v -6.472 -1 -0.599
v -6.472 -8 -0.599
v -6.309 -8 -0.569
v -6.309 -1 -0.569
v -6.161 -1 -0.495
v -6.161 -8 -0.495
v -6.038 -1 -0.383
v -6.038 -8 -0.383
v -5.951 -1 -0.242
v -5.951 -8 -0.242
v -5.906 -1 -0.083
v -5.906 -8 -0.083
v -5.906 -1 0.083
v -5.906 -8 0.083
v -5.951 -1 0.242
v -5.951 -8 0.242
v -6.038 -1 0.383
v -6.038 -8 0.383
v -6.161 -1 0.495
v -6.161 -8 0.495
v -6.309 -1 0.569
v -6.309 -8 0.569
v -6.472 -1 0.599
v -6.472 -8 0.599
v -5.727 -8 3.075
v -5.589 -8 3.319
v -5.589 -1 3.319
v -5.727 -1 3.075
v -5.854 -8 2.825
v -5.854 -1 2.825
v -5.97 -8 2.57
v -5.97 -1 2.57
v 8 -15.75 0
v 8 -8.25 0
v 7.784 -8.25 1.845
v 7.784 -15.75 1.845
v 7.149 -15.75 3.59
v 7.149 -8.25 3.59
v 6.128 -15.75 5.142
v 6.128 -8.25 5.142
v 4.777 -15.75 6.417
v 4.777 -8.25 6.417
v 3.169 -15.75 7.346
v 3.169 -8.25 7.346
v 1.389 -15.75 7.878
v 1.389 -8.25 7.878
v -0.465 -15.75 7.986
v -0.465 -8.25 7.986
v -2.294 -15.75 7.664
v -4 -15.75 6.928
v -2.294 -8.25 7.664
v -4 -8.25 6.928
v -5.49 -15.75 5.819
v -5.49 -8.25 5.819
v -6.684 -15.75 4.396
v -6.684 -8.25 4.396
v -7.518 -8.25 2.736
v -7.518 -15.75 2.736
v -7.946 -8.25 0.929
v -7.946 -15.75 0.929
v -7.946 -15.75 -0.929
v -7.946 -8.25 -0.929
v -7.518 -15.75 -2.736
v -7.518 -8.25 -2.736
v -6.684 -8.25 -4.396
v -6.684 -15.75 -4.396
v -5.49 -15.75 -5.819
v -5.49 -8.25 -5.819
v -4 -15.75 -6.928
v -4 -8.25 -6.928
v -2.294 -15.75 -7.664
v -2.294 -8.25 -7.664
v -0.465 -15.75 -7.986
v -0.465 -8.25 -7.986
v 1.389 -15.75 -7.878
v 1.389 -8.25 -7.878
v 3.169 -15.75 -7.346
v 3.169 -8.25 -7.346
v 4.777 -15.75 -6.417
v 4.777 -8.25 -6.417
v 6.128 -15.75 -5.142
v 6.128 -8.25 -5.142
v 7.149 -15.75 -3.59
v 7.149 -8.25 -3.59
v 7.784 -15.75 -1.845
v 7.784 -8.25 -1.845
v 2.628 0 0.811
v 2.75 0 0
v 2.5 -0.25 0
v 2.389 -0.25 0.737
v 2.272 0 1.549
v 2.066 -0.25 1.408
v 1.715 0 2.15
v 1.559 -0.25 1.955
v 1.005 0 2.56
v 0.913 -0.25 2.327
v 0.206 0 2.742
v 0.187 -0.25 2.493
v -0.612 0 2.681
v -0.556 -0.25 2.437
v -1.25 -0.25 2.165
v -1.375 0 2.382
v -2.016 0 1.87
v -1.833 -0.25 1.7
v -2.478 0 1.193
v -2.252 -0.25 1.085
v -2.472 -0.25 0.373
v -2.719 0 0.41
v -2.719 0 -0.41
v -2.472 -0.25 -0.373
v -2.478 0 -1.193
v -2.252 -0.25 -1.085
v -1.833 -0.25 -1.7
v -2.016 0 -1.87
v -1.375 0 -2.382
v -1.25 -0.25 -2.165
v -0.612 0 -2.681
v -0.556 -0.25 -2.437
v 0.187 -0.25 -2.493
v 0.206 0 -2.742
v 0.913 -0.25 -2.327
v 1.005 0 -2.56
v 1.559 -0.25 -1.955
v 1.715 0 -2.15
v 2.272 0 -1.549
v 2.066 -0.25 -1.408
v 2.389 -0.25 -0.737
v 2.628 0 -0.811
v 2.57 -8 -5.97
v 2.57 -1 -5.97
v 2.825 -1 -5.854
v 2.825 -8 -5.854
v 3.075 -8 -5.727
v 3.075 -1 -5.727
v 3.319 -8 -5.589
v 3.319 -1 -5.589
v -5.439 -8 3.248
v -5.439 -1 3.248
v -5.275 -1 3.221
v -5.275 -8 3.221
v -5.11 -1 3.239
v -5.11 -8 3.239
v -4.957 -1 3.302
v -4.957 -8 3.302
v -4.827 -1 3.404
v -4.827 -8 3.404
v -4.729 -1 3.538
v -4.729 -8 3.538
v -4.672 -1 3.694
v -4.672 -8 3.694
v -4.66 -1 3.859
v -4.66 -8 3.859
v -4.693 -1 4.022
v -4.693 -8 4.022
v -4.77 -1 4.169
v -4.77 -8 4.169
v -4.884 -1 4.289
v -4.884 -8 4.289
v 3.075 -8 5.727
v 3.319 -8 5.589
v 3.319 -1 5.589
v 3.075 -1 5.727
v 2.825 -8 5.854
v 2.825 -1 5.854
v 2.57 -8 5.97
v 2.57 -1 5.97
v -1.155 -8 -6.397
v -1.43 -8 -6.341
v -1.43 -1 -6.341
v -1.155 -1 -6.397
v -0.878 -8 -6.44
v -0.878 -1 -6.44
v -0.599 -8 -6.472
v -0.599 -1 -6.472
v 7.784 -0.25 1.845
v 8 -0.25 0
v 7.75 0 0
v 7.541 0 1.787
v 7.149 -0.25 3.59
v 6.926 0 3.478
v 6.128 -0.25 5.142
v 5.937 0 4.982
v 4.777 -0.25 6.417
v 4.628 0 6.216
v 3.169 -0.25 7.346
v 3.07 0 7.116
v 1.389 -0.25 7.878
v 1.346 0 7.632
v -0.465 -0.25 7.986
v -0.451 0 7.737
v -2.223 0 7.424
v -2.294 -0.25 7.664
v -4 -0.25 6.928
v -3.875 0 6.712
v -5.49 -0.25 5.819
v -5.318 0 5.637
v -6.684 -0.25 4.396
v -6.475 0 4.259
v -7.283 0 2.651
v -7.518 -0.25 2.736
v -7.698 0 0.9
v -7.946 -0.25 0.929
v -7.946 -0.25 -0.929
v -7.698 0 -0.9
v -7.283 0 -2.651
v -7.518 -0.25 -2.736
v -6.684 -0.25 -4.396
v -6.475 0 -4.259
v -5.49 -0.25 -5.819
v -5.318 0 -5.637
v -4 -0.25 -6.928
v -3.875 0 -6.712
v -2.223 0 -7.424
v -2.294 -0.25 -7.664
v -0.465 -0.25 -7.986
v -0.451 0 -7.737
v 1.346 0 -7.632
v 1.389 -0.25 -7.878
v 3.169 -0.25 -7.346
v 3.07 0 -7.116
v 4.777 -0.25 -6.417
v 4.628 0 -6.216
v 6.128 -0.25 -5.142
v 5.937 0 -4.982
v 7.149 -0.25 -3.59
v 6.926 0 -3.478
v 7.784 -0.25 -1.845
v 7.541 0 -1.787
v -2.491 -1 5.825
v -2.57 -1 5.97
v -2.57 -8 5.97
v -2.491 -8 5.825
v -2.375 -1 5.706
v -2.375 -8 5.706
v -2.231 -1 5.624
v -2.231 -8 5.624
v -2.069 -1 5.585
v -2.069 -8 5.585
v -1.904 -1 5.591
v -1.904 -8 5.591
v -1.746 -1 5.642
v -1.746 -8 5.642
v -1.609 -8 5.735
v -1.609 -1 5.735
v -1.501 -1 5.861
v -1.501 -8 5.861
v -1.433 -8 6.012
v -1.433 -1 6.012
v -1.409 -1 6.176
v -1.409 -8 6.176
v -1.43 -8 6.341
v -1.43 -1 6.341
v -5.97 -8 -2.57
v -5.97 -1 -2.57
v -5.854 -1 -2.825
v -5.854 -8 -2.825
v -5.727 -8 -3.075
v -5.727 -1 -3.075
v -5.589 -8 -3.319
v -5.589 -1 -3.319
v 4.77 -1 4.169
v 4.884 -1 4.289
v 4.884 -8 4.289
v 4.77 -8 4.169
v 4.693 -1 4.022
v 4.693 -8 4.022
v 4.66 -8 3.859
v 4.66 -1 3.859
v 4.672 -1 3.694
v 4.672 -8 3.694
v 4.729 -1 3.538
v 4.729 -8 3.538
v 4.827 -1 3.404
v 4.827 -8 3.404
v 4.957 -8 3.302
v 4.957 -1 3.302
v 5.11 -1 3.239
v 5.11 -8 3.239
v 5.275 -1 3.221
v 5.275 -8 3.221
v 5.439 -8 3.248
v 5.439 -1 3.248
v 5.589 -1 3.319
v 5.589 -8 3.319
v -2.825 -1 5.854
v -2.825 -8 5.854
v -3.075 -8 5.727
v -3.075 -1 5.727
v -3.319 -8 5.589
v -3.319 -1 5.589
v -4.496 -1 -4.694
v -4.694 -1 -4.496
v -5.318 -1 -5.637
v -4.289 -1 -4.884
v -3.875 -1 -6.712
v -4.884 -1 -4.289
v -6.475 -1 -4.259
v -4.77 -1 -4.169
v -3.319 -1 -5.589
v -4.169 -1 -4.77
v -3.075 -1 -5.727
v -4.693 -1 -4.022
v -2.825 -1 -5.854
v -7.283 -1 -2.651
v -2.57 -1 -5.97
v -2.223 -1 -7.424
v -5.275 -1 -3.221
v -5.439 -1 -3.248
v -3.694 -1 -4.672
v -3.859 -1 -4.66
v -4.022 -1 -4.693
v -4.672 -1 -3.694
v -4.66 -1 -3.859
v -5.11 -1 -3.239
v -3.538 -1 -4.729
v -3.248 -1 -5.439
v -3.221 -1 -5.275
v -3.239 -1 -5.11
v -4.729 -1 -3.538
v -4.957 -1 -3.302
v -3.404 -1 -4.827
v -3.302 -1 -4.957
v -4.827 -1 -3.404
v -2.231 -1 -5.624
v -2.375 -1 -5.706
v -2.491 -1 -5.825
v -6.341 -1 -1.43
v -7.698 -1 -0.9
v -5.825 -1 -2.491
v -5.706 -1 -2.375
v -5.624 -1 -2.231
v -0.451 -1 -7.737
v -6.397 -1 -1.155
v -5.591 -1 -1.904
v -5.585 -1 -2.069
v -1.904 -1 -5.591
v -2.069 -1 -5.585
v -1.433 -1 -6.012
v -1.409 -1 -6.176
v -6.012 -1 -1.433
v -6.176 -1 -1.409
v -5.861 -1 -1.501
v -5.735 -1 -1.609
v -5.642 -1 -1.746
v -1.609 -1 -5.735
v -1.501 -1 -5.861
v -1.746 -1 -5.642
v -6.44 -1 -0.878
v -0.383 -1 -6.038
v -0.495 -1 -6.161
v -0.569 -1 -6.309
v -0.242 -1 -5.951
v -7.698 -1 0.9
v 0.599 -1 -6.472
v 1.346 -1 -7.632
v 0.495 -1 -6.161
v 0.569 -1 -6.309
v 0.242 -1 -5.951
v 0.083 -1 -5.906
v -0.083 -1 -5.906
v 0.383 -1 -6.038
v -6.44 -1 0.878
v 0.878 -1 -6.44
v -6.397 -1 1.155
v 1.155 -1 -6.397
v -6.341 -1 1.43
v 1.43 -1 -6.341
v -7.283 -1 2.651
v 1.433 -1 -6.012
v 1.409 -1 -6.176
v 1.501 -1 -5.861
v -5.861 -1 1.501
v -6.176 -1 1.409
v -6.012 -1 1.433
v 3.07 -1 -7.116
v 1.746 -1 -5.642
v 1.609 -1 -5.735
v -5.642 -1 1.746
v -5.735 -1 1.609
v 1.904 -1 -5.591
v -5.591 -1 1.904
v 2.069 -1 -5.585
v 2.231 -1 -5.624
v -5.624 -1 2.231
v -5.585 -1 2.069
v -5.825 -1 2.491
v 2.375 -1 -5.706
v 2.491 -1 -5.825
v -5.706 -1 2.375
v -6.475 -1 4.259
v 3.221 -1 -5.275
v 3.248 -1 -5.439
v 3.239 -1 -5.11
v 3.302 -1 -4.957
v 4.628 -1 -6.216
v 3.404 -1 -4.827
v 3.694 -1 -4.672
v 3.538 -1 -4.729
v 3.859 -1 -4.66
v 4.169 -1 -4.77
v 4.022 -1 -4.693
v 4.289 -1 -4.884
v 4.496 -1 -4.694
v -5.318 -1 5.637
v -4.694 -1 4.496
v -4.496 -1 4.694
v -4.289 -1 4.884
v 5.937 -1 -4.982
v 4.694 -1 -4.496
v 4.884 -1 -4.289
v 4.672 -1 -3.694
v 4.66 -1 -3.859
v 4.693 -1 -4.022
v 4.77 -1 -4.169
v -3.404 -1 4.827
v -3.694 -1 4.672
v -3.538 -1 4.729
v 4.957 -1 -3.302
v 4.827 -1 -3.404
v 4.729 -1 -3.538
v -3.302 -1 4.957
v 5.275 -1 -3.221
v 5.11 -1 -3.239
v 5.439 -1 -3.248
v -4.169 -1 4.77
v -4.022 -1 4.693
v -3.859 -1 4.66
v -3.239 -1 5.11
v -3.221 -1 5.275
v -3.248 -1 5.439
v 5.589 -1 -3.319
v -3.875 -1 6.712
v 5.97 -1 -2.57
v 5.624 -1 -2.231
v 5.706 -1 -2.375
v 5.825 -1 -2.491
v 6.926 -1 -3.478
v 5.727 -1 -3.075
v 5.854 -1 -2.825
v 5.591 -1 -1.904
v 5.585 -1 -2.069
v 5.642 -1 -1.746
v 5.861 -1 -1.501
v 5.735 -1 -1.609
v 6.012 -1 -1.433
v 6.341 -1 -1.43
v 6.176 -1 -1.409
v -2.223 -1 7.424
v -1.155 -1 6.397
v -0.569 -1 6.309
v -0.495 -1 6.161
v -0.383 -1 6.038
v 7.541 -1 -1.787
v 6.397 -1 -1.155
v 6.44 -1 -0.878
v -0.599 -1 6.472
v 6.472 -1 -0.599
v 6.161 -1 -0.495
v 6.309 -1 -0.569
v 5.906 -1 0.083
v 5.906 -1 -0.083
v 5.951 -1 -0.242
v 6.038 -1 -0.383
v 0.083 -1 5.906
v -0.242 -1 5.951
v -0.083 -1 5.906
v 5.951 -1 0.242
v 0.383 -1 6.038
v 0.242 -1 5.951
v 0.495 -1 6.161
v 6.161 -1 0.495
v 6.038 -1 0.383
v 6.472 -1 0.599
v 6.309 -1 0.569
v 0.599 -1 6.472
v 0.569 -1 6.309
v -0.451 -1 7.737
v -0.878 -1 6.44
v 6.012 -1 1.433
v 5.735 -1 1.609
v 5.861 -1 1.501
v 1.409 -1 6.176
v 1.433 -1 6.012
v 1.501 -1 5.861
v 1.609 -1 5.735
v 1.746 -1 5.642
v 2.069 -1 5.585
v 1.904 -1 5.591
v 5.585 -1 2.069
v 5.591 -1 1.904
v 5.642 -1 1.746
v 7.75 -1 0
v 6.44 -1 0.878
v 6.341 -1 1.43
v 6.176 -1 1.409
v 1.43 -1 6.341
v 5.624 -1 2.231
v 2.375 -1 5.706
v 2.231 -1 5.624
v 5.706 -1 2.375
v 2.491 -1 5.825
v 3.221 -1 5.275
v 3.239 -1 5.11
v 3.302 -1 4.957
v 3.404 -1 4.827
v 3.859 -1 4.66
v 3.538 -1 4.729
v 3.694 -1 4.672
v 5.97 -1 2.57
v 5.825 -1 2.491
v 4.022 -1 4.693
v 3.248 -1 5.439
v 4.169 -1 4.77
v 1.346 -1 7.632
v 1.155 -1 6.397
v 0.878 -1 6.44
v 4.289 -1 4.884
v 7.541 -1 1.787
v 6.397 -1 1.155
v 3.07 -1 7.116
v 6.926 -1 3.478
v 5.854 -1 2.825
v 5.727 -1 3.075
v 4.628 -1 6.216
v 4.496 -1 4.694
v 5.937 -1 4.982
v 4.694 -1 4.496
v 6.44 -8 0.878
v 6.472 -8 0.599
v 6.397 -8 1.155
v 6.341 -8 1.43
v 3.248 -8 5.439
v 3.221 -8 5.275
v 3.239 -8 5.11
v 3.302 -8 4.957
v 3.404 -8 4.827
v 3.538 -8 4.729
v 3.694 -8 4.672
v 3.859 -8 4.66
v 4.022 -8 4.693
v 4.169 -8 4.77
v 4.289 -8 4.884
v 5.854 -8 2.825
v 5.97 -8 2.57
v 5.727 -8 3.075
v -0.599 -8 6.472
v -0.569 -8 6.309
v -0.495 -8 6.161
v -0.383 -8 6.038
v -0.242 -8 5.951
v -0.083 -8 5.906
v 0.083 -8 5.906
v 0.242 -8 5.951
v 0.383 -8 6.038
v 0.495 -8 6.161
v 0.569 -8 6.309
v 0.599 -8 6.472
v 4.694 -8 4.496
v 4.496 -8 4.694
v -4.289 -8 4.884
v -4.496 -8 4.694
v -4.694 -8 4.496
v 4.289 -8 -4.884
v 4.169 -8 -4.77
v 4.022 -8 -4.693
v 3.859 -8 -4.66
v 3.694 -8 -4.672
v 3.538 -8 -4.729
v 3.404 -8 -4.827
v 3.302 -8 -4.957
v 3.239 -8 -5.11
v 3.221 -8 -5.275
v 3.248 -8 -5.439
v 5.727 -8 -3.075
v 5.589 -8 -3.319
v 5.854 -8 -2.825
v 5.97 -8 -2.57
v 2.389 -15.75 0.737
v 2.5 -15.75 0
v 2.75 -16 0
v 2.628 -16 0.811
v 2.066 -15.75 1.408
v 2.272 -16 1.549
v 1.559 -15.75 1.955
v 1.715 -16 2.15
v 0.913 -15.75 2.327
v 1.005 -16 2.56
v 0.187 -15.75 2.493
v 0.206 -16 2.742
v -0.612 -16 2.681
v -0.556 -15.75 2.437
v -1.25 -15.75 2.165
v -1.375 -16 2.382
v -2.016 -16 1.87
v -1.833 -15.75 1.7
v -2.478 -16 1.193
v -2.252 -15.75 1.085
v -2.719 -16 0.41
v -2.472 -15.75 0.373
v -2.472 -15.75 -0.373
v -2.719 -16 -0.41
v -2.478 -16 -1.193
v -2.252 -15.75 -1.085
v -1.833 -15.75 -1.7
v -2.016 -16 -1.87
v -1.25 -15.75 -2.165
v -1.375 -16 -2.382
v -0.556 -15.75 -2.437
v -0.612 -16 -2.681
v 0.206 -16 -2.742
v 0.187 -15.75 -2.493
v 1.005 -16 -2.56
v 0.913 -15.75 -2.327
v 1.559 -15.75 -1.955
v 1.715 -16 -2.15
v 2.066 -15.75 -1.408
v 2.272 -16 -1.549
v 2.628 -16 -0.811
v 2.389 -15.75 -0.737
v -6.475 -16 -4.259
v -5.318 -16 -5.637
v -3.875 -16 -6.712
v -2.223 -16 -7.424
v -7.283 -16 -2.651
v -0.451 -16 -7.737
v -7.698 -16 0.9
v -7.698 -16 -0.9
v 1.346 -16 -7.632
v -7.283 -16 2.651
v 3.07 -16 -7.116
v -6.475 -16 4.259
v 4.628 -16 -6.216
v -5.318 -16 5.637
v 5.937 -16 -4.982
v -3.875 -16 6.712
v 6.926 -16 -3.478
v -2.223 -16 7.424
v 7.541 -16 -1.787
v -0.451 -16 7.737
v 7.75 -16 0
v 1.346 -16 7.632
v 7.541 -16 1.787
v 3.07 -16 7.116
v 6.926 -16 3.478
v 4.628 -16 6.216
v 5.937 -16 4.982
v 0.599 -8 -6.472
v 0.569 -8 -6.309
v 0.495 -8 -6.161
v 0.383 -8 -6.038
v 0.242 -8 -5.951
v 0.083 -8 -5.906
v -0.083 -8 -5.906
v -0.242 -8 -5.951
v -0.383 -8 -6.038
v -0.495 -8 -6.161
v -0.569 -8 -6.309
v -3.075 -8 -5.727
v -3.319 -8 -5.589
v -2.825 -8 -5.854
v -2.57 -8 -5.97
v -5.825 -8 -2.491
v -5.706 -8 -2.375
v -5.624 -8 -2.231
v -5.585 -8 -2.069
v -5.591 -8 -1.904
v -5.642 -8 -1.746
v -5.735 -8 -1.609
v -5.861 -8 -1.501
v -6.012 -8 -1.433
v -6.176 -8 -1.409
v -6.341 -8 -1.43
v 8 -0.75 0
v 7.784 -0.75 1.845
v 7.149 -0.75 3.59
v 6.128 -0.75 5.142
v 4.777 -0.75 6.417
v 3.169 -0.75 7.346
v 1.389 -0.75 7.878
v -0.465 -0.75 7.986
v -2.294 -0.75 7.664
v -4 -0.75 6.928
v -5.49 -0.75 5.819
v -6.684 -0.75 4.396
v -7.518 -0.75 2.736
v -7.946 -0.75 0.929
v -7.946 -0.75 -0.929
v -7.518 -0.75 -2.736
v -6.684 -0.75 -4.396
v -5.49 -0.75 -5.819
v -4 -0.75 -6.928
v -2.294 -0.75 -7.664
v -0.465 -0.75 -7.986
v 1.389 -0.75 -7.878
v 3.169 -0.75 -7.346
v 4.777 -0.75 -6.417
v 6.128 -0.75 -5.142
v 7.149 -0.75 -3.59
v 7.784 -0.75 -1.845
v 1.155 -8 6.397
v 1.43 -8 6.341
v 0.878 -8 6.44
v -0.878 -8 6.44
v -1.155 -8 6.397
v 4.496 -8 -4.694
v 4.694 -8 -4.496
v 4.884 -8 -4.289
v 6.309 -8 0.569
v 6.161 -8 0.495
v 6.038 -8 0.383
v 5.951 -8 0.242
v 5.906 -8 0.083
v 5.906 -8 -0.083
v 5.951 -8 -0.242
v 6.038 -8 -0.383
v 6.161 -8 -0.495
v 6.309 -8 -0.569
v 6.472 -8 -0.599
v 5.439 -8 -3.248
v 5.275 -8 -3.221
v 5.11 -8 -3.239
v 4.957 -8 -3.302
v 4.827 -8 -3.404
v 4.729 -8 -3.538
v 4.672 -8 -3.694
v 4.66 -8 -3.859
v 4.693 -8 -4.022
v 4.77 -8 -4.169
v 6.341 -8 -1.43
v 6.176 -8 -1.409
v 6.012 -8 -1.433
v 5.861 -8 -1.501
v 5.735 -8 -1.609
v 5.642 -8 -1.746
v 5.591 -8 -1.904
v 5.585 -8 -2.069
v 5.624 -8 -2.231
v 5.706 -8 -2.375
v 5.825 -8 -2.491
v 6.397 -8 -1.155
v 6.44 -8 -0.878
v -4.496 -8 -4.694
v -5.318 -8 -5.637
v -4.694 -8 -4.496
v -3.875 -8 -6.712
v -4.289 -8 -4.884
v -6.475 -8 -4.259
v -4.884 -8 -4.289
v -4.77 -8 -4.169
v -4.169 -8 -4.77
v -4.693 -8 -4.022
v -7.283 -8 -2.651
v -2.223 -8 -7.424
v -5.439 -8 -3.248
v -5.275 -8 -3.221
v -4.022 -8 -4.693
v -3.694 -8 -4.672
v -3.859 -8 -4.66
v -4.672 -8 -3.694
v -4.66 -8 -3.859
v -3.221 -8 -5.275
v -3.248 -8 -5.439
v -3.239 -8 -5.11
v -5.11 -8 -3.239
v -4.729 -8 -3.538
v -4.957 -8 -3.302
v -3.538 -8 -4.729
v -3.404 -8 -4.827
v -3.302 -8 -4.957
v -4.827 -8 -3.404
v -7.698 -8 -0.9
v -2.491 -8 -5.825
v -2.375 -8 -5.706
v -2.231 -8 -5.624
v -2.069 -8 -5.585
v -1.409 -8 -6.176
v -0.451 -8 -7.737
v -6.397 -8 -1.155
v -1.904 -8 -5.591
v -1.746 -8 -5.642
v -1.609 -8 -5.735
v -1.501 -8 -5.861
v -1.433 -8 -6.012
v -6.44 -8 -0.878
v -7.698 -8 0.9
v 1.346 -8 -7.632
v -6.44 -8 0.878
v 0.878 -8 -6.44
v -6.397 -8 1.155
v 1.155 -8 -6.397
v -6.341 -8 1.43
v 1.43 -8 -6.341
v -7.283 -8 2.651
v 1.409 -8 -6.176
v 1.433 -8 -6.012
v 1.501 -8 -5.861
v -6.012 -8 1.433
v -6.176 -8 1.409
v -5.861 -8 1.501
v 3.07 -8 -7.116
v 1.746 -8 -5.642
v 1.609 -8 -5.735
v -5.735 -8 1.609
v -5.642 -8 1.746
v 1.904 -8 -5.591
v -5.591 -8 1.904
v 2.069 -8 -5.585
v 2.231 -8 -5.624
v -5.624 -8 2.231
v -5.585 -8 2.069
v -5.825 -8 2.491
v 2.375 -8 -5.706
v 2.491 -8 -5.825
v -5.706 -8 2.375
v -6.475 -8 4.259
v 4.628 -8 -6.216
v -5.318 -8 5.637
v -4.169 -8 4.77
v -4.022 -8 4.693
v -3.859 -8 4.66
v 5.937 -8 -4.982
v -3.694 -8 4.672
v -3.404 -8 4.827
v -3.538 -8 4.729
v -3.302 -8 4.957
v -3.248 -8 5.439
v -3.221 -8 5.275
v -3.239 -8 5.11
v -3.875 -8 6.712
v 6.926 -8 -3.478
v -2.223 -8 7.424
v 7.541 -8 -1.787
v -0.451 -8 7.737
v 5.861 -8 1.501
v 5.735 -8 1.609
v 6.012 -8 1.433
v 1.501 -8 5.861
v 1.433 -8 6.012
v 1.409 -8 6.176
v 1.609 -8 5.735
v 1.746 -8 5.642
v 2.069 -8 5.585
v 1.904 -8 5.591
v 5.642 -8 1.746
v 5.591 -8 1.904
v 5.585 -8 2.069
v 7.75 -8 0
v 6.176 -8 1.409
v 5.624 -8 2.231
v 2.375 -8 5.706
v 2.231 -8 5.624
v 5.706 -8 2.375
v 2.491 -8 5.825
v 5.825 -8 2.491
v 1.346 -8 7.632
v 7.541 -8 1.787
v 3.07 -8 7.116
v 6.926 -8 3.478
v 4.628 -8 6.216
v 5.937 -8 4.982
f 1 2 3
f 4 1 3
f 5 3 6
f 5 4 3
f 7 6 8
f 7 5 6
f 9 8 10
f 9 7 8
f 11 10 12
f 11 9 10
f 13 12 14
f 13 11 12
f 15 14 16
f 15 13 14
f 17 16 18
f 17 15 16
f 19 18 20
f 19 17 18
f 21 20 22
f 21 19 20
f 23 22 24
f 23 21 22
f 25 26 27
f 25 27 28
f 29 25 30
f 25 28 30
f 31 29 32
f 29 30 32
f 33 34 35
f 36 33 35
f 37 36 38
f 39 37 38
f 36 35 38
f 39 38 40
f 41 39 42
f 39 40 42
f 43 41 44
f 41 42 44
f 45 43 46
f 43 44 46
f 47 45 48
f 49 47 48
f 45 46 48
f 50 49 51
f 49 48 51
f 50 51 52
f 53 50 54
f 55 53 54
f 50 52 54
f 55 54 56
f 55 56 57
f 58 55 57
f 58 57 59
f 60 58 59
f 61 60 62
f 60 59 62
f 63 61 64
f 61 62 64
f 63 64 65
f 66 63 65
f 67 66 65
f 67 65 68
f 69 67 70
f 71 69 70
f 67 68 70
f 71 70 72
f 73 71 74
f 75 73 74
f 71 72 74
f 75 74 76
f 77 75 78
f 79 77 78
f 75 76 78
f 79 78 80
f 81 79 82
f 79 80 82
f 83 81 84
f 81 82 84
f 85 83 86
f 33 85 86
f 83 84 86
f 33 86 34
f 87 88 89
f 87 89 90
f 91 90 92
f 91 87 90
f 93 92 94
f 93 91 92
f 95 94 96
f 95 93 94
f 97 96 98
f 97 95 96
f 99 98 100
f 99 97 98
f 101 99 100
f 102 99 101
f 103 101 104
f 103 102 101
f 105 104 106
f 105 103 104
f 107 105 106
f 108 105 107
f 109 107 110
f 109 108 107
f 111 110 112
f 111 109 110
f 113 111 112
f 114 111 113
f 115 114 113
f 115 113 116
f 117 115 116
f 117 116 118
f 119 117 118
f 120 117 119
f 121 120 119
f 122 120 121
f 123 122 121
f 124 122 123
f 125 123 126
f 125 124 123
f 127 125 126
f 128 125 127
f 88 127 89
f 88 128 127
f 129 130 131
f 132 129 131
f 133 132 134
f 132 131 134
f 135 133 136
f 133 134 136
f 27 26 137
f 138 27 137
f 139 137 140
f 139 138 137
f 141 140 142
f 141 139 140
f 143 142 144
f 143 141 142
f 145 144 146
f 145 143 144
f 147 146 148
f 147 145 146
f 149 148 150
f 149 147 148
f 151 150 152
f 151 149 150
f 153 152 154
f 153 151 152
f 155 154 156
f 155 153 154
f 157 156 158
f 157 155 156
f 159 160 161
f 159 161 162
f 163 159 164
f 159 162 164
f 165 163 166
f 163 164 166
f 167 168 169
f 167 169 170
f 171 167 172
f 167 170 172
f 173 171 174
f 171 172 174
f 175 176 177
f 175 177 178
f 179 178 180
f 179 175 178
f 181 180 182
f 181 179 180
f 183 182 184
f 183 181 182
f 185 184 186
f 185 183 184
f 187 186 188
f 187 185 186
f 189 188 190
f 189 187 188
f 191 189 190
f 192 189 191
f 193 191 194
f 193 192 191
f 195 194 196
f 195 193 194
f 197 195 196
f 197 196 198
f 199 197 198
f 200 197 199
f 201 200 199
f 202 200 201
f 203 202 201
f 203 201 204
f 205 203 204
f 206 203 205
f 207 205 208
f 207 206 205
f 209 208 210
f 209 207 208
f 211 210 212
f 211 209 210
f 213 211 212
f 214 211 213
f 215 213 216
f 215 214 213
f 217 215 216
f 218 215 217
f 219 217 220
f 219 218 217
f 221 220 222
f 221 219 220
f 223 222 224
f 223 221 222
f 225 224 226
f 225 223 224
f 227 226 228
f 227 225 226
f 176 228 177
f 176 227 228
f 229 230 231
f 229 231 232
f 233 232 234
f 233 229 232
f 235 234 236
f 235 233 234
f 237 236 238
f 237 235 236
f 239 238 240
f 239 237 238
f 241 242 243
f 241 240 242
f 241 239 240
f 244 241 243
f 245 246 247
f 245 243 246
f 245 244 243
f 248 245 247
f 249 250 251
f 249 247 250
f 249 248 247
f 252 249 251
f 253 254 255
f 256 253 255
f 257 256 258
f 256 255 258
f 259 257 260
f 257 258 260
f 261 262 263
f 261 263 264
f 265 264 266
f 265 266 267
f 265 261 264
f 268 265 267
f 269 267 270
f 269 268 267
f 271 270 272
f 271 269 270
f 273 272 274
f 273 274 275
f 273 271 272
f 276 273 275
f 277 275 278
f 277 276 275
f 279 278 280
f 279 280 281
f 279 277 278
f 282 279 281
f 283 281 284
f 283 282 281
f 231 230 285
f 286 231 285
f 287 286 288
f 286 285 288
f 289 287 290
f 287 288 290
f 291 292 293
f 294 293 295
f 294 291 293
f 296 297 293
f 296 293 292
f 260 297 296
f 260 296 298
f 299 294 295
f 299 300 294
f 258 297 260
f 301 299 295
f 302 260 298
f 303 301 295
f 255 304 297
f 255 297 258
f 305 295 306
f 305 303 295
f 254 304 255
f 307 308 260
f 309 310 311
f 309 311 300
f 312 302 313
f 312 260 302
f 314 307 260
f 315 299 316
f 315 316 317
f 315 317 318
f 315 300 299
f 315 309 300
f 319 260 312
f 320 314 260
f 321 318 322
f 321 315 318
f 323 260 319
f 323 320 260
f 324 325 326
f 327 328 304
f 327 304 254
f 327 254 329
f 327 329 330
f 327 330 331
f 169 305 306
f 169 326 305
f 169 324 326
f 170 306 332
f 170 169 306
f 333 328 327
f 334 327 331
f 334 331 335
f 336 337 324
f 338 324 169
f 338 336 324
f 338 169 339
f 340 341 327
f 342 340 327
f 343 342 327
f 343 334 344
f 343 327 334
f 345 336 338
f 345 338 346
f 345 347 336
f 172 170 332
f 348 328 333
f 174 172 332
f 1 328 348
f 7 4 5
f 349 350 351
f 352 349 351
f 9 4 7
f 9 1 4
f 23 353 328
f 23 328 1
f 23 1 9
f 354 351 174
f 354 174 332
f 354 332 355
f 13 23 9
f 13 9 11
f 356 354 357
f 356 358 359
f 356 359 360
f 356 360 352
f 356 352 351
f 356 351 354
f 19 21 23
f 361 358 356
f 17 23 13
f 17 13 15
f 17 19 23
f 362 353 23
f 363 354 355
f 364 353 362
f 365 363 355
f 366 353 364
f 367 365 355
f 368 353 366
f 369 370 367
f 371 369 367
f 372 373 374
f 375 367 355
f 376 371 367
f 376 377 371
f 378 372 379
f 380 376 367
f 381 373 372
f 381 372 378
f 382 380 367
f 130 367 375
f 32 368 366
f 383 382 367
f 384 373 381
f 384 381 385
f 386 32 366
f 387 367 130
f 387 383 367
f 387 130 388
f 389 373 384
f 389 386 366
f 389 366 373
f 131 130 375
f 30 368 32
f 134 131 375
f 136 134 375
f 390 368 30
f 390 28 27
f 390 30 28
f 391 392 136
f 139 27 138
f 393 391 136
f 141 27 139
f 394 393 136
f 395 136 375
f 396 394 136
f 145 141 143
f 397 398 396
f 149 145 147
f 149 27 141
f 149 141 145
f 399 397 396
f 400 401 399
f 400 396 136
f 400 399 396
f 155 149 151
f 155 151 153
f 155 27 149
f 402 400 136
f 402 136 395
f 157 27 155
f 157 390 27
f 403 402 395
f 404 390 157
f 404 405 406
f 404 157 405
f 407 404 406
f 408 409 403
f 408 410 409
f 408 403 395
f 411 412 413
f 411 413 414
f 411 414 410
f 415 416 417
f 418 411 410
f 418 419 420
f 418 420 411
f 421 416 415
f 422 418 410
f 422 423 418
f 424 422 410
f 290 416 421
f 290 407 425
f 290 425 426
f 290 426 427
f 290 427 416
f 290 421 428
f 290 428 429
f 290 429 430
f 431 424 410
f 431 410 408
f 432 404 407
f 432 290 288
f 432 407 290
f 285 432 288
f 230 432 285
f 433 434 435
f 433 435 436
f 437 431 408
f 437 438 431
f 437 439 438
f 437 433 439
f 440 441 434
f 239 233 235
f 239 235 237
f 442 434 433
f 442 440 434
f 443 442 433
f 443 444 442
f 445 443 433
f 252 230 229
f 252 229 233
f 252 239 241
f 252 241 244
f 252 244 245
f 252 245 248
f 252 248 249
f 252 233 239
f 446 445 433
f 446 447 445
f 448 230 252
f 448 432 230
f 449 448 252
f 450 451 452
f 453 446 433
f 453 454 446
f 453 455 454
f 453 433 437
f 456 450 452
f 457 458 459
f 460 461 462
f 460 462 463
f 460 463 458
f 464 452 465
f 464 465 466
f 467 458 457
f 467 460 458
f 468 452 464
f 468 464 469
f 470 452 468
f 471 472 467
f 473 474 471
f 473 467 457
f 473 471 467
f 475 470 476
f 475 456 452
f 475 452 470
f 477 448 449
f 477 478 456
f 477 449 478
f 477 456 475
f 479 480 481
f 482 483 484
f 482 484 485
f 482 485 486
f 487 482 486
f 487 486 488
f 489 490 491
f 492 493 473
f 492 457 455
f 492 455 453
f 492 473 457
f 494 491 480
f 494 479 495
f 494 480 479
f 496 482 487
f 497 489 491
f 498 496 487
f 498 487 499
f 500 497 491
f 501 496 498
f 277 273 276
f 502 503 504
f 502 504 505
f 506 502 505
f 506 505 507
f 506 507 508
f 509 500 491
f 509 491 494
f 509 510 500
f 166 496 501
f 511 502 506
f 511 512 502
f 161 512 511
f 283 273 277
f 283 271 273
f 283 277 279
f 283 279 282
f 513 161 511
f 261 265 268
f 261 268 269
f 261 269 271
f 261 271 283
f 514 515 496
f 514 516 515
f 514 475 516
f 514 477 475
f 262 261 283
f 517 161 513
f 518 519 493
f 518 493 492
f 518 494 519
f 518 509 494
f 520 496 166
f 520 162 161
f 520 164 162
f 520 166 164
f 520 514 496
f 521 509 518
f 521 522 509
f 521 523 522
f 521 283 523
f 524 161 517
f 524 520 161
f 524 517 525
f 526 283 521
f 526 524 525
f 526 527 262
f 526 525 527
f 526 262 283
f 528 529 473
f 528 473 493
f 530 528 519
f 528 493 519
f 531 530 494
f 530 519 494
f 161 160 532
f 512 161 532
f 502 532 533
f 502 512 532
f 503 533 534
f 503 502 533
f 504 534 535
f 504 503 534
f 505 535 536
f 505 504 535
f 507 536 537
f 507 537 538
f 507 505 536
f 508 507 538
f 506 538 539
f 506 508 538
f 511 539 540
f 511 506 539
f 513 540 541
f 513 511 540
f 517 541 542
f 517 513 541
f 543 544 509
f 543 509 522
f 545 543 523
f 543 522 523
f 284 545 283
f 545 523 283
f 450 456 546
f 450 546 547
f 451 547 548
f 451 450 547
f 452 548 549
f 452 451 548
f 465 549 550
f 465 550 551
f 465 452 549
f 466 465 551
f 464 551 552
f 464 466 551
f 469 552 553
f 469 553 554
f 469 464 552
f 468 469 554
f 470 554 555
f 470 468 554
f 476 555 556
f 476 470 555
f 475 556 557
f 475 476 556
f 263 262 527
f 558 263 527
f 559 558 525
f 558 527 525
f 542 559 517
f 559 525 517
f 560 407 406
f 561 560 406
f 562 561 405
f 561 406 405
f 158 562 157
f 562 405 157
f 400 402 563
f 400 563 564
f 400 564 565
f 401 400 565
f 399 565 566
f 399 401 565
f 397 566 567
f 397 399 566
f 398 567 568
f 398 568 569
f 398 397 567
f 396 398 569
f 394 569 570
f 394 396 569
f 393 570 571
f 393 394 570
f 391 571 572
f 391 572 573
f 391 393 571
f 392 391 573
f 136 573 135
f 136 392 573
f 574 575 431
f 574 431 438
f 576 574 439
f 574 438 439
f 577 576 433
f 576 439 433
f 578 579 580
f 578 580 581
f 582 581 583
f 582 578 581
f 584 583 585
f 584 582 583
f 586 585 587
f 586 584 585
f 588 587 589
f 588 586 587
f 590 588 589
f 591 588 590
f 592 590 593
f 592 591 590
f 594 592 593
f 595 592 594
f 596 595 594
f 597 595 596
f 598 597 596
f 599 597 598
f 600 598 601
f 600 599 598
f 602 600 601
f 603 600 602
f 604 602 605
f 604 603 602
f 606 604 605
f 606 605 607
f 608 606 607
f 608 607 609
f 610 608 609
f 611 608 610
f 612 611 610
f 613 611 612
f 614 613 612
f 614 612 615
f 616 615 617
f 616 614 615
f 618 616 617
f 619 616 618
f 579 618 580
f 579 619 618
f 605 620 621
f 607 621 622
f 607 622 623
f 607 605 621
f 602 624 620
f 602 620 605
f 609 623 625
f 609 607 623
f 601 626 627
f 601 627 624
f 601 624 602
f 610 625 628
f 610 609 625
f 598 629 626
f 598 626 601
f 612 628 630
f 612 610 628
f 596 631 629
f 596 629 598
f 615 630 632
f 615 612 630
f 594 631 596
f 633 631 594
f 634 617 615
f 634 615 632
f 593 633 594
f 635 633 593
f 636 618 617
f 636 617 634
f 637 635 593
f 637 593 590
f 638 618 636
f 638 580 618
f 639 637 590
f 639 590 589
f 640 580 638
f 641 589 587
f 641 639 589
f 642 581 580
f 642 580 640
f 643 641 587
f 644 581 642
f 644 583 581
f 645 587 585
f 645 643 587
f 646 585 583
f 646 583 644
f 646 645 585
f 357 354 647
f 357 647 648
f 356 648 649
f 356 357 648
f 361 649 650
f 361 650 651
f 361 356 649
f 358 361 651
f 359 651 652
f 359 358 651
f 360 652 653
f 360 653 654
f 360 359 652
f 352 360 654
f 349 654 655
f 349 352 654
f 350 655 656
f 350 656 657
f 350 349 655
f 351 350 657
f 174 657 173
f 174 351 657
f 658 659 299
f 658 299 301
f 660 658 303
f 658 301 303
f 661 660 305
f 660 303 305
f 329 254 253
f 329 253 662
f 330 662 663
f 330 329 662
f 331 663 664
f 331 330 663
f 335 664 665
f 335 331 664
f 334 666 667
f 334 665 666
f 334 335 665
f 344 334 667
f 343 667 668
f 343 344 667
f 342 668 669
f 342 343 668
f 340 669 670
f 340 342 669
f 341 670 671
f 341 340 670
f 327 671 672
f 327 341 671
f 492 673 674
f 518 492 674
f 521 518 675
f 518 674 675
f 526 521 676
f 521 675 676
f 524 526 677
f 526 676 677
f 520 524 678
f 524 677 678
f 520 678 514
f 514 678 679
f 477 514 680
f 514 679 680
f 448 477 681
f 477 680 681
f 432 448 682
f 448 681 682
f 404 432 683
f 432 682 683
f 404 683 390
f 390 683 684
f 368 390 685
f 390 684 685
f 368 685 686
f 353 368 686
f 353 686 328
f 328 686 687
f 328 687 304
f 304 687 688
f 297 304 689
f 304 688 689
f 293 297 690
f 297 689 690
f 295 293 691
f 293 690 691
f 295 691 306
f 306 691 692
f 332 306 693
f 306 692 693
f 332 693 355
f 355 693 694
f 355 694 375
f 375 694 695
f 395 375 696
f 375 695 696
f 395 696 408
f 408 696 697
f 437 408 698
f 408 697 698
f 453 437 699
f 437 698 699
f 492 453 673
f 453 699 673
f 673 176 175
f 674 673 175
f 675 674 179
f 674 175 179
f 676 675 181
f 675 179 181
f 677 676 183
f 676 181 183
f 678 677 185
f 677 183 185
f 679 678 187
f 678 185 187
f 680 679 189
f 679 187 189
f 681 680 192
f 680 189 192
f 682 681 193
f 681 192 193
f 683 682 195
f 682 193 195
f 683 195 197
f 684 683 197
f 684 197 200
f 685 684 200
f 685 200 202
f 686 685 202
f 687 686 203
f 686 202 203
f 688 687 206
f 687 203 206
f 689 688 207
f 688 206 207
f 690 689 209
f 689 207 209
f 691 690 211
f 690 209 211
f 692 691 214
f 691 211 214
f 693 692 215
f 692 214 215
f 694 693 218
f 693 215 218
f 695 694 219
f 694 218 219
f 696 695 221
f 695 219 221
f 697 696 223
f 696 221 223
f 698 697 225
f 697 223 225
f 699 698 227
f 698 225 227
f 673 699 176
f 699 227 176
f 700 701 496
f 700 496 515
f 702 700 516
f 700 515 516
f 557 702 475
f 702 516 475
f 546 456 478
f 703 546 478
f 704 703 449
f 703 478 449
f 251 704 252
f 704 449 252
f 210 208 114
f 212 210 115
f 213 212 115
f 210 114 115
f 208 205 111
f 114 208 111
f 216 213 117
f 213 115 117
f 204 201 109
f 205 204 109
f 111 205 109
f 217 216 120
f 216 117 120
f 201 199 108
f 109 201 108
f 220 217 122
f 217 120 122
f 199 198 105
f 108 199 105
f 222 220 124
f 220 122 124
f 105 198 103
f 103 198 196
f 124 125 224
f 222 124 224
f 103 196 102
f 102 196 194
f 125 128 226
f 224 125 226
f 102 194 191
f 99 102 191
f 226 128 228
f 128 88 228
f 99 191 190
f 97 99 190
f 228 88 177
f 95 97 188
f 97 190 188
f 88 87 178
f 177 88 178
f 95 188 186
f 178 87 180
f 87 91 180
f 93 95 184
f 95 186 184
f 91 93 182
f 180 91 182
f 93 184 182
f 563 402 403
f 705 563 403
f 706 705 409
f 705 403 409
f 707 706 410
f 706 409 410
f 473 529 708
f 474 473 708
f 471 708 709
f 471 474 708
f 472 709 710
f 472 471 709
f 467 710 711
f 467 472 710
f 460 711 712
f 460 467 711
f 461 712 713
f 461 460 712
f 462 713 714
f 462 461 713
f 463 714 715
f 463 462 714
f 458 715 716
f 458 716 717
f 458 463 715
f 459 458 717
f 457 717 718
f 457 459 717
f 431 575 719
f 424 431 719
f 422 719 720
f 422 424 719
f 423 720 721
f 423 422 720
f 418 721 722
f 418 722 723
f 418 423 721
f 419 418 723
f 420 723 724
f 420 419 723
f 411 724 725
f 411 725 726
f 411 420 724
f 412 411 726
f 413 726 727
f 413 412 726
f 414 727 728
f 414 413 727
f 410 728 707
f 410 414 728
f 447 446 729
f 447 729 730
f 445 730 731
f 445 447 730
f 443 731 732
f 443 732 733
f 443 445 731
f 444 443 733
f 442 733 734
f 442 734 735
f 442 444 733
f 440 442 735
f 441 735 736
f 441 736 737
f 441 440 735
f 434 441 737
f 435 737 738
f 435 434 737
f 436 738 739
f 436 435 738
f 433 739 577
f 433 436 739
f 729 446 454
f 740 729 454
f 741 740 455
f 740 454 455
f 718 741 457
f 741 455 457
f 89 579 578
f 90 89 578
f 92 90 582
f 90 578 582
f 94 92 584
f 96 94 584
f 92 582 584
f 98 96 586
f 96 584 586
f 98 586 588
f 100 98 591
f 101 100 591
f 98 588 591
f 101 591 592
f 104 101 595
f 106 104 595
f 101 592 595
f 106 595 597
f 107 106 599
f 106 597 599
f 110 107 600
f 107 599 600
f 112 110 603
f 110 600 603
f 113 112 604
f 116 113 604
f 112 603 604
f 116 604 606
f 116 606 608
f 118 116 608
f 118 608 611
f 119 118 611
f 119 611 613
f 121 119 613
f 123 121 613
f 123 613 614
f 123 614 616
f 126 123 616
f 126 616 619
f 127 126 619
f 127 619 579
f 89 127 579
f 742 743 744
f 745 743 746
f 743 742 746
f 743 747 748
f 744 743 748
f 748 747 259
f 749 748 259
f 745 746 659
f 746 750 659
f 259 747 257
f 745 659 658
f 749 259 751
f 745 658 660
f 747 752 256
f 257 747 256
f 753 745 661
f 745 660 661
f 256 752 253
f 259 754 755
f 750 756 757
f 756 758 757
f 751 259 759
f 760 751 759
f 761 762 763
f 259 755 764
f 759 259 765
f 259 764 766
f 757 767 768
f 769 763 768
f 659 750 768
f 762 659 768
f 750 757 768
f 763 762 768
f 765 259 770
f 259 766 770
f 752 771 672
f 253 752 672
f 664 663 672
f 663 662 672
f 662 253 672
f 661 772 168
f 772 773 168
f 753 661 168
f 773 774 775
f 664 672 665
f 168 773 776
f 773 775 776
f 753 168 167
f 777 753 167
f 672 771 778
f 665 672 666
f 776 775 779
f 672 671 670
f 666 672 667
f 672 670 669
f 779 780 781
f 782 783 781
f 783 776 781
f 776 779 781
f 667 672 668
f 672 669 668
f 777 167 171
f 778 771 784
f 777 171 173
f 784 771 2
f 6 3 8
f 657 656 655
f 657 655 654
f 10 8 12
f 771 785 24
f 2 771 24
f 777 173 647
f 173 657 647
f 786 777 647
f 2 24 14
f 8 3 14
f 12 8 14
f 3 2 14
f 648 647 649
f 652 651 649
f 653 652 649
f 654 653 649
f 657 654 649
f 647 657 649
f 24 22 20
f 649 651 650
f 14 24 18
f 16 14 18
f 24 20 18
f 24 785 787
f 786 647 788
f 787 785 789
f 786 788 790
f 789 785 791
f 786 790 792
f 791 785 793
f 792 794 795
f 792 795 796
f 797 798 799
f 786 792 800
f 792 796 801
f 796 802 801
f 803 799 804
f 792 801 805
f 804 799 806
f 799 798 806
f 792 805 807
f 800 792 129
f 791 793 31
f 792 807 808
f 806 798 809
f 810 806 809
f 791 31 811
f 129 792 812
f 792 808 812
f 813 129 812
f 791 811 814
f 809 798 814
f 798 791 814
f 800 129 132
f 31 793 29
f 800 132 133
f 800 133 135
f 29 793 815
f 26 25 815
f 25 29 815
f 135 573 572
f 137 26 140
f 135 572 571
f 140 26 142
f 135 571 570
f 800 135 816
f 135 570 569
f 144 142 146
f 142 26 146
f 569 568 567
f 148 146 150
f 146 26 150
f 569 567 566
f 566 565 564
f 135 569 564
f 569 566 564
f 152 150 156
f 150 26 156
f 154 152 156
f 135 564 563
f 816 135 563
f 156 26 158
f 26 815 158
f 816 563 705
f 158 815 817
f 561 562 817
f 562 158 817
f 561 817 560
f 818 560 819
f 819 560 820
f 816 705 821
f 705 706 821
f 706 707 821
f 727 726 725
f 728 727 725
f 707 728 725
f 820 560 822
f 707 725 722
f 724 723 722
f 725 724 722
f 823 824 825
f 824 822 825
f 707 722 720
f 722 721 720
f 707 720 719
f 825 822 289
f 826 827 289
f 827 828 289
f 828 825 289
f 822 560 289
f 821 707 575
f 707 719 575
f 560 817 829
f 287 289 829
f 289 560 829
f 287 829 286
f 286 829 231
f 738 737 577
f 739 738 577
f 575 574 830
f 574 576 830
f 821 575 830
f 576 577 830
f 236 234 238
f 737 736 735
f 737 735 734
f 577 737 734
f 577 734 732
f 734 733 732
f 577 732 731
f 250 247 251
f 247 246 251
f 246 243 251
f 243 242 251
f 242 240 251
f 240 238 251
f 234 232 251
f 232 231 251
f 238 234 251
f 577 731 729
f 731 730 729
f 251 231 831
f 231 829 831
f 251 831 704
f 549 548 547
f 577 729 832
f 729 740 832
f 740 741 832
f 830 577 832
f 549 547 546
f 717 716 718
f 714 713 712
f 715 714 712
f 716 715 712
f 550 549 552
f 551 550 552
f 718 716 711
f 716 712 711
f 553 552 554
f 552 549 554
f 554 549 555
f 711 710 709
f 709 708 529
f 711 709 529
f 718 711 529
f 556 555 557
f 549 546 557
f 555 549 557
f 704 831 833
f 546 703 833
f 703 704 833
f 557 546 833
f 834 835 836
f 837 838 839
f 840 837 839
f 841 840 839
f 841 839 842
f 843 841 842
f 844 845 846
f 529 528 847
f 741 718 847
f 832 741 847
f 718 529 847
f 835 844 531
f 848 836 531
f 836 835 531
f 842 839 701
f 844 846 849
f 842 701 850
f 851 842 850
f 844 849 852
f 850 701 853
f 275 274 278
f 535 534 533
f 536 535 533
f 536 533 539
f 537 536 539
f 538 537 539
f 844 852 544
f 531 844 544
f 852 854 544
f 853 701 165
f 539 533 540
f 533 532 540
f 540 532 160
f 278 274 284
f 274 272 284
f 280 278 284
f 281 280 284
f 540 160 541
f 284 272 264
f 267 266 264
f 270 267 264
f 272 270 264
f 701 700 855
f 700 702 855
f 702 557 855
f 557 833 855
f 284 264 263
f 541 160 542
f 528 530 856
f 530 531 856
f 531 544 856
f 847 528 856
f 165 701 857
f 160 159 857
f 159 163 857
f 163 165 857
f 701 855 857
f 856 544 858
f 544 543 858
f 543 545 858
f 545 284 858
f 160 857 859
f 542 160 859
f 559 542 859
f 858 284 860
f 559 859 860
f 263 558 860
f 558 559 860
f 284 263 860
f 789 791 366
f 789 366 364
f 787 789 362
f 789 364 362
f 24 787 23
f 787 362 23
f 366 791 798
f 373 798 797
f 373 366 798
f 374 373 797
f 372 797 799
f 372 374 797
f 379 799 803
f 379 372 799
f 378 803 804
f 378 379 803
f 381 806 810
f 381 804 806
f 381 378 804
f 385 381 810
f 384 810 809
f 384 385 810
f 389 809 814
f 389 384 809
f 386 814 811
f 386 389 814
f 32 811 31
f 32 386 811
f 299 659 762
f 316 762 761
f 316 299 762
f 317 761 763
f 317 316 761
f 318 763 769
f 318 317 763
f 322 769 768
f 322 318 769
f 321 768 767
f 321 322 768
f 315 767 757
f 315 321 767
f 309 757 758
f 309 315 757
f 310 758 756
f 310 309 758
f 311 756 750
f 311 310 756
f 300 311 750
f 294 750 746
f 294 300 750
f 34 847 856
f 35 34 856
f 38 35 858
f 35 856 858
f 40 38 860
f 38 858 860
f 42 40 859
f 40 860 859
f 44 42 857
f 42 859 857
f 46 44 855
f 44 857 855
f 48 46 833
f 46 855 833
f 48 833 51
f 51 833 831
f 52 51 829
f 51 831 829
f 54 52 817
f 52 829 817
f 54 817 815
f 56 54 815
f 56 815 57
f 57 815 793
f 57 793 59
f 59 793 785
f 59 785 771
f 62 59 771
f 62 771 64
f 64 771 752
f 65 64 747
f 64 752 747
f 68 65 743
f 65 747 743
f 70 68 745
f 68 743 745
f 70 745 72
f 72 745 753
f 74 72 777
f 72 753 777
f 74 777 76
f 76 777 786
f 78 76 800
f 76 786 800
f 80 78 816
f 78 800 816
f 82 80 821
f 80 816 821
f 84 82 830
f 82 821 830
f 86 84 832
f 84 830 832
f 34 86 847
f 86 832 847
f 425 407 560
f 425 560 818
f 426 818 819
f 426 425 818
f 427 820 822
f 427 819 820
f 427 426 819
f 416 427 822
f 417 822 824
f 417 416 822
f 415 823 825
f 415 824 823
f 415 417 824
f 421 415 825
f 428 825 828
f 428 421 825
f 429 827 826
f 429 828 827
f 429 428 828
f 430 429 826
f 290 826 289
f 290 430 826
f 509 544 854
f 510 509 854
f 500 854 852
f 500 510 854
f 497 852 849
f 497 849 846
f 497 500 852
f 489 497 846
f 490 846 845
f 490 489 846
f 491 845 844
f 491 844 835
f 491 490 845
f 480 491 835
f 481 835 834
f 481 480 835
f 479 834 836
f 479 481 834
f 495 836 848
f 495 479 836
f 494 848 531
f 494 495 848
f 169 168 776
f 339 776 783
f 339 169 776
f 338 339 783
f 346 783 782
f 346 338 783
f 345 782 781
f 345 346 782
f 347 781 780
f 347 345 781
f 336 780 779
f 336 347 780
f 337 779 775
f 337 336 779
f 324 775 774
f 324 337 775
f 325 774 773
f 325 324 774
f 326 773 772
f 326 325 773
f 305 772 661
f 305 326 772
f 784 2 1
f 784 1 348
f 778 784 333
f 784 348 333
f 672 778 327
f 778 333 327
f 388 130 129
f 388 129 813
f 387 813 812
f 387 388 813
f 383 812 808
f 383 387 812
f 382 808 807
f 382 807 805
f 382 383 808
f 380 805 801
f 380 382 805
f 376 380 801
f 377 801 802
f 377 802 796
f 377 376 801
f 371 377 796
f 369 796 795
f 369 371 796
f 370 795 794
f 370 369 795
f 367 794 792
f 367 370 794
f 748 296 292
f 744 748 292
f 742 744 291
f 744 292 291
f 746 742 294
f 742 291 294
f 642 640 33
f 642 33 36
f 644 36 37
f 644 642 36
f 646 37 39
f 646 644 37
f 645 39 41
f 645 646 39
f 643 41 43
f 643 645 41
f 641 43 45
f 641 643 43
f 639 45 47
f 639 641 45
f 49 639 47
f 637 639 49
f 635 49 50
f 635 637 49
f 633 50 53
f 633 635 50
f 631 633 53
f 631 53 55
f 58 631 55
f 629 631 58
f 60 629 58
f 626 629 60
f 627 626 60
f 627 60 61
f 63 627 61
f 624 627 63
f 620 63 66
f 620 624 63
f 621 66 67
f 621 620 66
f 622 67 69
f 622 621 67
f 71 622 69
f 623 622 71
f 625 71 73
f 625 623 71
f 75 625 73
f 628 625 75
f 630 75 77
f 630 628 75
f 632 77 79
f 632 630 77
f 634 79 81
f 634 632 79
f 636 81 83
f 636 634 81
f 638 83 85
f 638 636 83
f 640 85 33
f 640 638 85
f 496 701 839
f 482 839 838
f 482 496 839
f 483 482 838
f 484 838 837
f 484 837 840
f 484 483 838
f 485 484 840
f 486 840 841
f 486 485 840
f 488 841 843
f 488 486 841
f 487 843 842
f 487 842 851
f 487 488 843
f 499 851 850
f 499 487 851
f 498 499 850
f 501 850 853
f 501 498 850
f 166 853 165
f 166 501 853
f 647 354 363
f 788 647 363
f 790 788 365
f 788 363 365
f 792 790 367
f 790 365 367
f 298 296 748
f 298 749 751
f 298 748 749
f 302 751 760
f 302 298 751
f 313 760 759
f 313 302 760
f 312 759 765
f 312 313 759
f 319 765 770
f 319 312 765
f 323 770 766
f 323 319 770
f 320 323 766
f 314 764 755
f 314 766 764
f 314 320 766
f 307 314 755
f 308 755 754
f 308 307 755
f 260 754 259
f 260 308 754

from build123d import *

# Parameters (mm, degrees)
F0_R     = 8
F1_DEPTH = 1
F2_R     = 6.5
F3_DEPTH = 7
F4_R     = 8
F5_DEPTH = 8
F6_R     = 0.6
F7_DEPTH = 7
F8_R     = 2.5
F9_DEPTH = 16.001
F10_SIZE = 0.25


with BuildPart() as f1:
    # F0 (on Front) → F1 (new body)
    with BuildSketch(Plane.XZ):
        Circle(F0_R)
    extrude(amount=F1_DEPTH)

    # F2 (on face) → F3 (join)
    with BuildSketch(Plane.XZ.offset(1)):
        Circle(F2_R)
    extrude(amount=F3_DEPTH)

    # F4 (on face) → F5 (join)
    with BuildSketch(Plane.XZ.offset(8)):
        Circle(F4_R)
    extrude(amount=F5_DEPTH)

    # F6 (on face) → F7 (cut, through all)
    with BuildSketch(Plane.XZ.offset(1)):
        with Locations((0, 6.5)):
            Circle(F6_R)
        with Locations((-2.00861, 6.181867)):
            Circle(F6_R)
        with Locations((-3.820604, 5.25861)):
            Circle(F6_R)
        with Locations((-5.25861, 3.820604)):
            Circle(F6_R)
        with Locations((-6.181867, 2.00861)):
            Circle(F6_R)
        with Locations((-6.5, 0)):
            Circle(F6_R)
        with Locations((-6.181867, -2.00861)):
            Circle(F6_R)
        with Locations((-5.25861, -3.820604)):
            Circle(F6_R)
        with Locations((-3.820604, -5.25861)):
            Circle(F6_R)
        with Locations((-2.00861, -6.181867)):
            Circle(F6_R)
        with Locations((0, -6.5)):
            Circle(F6_R)
        with Locations((2.00861, -6.181867)):
            Circle(F6_R)
        with Locations((3.820604, -5.25861)):
            Circle(F6_R)
        with Locations((5.25861, -3.820604)):
            Circle(F6_R)
        with Locations((6.181867, -2.00861)):
            Circle(F6_R)
        with Locations((6.5, 0)):
            Circle(F6_R)
        with Locations((6.181867, 2.00861)):
            Circle(F6_R)
        with Locations((5.25861, 3.820604)):
            Circle(F6_R)
        with Locations((3.820604, 5.25861)):
            Circle(F6_R)
        with Locations((2.00861, 6.181867)):
            Circle(F6_R)
    extrude(amount=F7_DEPTH, mode=Mode.SUBTRACT)

    # F8 (on face) → F9 (cut, through all)
    with BuildSketch(Plane.XZ.offset(16)):
        Circle(F8_R)
    extrude(amount=-F9_DEPTH, mode=Mode.SUBTRACT)

    # F10
    f10_edges = [f1.edges().sort_by_distance(p)[0] for p in [
        (8, -12, 0),
        (-8, -8, 0),
        (-8, -16, 0),
        (8, -0.5, 0),
        (-8, 0, 0),
        (-8, -1, 0),
        (-2.5, -16, 0),
        (2.5, -8, 0),
        (-2.5, 0, 0),
    ]]
    chamfer(f10_edges, length=F10_SIZE)


solid = f1.part
